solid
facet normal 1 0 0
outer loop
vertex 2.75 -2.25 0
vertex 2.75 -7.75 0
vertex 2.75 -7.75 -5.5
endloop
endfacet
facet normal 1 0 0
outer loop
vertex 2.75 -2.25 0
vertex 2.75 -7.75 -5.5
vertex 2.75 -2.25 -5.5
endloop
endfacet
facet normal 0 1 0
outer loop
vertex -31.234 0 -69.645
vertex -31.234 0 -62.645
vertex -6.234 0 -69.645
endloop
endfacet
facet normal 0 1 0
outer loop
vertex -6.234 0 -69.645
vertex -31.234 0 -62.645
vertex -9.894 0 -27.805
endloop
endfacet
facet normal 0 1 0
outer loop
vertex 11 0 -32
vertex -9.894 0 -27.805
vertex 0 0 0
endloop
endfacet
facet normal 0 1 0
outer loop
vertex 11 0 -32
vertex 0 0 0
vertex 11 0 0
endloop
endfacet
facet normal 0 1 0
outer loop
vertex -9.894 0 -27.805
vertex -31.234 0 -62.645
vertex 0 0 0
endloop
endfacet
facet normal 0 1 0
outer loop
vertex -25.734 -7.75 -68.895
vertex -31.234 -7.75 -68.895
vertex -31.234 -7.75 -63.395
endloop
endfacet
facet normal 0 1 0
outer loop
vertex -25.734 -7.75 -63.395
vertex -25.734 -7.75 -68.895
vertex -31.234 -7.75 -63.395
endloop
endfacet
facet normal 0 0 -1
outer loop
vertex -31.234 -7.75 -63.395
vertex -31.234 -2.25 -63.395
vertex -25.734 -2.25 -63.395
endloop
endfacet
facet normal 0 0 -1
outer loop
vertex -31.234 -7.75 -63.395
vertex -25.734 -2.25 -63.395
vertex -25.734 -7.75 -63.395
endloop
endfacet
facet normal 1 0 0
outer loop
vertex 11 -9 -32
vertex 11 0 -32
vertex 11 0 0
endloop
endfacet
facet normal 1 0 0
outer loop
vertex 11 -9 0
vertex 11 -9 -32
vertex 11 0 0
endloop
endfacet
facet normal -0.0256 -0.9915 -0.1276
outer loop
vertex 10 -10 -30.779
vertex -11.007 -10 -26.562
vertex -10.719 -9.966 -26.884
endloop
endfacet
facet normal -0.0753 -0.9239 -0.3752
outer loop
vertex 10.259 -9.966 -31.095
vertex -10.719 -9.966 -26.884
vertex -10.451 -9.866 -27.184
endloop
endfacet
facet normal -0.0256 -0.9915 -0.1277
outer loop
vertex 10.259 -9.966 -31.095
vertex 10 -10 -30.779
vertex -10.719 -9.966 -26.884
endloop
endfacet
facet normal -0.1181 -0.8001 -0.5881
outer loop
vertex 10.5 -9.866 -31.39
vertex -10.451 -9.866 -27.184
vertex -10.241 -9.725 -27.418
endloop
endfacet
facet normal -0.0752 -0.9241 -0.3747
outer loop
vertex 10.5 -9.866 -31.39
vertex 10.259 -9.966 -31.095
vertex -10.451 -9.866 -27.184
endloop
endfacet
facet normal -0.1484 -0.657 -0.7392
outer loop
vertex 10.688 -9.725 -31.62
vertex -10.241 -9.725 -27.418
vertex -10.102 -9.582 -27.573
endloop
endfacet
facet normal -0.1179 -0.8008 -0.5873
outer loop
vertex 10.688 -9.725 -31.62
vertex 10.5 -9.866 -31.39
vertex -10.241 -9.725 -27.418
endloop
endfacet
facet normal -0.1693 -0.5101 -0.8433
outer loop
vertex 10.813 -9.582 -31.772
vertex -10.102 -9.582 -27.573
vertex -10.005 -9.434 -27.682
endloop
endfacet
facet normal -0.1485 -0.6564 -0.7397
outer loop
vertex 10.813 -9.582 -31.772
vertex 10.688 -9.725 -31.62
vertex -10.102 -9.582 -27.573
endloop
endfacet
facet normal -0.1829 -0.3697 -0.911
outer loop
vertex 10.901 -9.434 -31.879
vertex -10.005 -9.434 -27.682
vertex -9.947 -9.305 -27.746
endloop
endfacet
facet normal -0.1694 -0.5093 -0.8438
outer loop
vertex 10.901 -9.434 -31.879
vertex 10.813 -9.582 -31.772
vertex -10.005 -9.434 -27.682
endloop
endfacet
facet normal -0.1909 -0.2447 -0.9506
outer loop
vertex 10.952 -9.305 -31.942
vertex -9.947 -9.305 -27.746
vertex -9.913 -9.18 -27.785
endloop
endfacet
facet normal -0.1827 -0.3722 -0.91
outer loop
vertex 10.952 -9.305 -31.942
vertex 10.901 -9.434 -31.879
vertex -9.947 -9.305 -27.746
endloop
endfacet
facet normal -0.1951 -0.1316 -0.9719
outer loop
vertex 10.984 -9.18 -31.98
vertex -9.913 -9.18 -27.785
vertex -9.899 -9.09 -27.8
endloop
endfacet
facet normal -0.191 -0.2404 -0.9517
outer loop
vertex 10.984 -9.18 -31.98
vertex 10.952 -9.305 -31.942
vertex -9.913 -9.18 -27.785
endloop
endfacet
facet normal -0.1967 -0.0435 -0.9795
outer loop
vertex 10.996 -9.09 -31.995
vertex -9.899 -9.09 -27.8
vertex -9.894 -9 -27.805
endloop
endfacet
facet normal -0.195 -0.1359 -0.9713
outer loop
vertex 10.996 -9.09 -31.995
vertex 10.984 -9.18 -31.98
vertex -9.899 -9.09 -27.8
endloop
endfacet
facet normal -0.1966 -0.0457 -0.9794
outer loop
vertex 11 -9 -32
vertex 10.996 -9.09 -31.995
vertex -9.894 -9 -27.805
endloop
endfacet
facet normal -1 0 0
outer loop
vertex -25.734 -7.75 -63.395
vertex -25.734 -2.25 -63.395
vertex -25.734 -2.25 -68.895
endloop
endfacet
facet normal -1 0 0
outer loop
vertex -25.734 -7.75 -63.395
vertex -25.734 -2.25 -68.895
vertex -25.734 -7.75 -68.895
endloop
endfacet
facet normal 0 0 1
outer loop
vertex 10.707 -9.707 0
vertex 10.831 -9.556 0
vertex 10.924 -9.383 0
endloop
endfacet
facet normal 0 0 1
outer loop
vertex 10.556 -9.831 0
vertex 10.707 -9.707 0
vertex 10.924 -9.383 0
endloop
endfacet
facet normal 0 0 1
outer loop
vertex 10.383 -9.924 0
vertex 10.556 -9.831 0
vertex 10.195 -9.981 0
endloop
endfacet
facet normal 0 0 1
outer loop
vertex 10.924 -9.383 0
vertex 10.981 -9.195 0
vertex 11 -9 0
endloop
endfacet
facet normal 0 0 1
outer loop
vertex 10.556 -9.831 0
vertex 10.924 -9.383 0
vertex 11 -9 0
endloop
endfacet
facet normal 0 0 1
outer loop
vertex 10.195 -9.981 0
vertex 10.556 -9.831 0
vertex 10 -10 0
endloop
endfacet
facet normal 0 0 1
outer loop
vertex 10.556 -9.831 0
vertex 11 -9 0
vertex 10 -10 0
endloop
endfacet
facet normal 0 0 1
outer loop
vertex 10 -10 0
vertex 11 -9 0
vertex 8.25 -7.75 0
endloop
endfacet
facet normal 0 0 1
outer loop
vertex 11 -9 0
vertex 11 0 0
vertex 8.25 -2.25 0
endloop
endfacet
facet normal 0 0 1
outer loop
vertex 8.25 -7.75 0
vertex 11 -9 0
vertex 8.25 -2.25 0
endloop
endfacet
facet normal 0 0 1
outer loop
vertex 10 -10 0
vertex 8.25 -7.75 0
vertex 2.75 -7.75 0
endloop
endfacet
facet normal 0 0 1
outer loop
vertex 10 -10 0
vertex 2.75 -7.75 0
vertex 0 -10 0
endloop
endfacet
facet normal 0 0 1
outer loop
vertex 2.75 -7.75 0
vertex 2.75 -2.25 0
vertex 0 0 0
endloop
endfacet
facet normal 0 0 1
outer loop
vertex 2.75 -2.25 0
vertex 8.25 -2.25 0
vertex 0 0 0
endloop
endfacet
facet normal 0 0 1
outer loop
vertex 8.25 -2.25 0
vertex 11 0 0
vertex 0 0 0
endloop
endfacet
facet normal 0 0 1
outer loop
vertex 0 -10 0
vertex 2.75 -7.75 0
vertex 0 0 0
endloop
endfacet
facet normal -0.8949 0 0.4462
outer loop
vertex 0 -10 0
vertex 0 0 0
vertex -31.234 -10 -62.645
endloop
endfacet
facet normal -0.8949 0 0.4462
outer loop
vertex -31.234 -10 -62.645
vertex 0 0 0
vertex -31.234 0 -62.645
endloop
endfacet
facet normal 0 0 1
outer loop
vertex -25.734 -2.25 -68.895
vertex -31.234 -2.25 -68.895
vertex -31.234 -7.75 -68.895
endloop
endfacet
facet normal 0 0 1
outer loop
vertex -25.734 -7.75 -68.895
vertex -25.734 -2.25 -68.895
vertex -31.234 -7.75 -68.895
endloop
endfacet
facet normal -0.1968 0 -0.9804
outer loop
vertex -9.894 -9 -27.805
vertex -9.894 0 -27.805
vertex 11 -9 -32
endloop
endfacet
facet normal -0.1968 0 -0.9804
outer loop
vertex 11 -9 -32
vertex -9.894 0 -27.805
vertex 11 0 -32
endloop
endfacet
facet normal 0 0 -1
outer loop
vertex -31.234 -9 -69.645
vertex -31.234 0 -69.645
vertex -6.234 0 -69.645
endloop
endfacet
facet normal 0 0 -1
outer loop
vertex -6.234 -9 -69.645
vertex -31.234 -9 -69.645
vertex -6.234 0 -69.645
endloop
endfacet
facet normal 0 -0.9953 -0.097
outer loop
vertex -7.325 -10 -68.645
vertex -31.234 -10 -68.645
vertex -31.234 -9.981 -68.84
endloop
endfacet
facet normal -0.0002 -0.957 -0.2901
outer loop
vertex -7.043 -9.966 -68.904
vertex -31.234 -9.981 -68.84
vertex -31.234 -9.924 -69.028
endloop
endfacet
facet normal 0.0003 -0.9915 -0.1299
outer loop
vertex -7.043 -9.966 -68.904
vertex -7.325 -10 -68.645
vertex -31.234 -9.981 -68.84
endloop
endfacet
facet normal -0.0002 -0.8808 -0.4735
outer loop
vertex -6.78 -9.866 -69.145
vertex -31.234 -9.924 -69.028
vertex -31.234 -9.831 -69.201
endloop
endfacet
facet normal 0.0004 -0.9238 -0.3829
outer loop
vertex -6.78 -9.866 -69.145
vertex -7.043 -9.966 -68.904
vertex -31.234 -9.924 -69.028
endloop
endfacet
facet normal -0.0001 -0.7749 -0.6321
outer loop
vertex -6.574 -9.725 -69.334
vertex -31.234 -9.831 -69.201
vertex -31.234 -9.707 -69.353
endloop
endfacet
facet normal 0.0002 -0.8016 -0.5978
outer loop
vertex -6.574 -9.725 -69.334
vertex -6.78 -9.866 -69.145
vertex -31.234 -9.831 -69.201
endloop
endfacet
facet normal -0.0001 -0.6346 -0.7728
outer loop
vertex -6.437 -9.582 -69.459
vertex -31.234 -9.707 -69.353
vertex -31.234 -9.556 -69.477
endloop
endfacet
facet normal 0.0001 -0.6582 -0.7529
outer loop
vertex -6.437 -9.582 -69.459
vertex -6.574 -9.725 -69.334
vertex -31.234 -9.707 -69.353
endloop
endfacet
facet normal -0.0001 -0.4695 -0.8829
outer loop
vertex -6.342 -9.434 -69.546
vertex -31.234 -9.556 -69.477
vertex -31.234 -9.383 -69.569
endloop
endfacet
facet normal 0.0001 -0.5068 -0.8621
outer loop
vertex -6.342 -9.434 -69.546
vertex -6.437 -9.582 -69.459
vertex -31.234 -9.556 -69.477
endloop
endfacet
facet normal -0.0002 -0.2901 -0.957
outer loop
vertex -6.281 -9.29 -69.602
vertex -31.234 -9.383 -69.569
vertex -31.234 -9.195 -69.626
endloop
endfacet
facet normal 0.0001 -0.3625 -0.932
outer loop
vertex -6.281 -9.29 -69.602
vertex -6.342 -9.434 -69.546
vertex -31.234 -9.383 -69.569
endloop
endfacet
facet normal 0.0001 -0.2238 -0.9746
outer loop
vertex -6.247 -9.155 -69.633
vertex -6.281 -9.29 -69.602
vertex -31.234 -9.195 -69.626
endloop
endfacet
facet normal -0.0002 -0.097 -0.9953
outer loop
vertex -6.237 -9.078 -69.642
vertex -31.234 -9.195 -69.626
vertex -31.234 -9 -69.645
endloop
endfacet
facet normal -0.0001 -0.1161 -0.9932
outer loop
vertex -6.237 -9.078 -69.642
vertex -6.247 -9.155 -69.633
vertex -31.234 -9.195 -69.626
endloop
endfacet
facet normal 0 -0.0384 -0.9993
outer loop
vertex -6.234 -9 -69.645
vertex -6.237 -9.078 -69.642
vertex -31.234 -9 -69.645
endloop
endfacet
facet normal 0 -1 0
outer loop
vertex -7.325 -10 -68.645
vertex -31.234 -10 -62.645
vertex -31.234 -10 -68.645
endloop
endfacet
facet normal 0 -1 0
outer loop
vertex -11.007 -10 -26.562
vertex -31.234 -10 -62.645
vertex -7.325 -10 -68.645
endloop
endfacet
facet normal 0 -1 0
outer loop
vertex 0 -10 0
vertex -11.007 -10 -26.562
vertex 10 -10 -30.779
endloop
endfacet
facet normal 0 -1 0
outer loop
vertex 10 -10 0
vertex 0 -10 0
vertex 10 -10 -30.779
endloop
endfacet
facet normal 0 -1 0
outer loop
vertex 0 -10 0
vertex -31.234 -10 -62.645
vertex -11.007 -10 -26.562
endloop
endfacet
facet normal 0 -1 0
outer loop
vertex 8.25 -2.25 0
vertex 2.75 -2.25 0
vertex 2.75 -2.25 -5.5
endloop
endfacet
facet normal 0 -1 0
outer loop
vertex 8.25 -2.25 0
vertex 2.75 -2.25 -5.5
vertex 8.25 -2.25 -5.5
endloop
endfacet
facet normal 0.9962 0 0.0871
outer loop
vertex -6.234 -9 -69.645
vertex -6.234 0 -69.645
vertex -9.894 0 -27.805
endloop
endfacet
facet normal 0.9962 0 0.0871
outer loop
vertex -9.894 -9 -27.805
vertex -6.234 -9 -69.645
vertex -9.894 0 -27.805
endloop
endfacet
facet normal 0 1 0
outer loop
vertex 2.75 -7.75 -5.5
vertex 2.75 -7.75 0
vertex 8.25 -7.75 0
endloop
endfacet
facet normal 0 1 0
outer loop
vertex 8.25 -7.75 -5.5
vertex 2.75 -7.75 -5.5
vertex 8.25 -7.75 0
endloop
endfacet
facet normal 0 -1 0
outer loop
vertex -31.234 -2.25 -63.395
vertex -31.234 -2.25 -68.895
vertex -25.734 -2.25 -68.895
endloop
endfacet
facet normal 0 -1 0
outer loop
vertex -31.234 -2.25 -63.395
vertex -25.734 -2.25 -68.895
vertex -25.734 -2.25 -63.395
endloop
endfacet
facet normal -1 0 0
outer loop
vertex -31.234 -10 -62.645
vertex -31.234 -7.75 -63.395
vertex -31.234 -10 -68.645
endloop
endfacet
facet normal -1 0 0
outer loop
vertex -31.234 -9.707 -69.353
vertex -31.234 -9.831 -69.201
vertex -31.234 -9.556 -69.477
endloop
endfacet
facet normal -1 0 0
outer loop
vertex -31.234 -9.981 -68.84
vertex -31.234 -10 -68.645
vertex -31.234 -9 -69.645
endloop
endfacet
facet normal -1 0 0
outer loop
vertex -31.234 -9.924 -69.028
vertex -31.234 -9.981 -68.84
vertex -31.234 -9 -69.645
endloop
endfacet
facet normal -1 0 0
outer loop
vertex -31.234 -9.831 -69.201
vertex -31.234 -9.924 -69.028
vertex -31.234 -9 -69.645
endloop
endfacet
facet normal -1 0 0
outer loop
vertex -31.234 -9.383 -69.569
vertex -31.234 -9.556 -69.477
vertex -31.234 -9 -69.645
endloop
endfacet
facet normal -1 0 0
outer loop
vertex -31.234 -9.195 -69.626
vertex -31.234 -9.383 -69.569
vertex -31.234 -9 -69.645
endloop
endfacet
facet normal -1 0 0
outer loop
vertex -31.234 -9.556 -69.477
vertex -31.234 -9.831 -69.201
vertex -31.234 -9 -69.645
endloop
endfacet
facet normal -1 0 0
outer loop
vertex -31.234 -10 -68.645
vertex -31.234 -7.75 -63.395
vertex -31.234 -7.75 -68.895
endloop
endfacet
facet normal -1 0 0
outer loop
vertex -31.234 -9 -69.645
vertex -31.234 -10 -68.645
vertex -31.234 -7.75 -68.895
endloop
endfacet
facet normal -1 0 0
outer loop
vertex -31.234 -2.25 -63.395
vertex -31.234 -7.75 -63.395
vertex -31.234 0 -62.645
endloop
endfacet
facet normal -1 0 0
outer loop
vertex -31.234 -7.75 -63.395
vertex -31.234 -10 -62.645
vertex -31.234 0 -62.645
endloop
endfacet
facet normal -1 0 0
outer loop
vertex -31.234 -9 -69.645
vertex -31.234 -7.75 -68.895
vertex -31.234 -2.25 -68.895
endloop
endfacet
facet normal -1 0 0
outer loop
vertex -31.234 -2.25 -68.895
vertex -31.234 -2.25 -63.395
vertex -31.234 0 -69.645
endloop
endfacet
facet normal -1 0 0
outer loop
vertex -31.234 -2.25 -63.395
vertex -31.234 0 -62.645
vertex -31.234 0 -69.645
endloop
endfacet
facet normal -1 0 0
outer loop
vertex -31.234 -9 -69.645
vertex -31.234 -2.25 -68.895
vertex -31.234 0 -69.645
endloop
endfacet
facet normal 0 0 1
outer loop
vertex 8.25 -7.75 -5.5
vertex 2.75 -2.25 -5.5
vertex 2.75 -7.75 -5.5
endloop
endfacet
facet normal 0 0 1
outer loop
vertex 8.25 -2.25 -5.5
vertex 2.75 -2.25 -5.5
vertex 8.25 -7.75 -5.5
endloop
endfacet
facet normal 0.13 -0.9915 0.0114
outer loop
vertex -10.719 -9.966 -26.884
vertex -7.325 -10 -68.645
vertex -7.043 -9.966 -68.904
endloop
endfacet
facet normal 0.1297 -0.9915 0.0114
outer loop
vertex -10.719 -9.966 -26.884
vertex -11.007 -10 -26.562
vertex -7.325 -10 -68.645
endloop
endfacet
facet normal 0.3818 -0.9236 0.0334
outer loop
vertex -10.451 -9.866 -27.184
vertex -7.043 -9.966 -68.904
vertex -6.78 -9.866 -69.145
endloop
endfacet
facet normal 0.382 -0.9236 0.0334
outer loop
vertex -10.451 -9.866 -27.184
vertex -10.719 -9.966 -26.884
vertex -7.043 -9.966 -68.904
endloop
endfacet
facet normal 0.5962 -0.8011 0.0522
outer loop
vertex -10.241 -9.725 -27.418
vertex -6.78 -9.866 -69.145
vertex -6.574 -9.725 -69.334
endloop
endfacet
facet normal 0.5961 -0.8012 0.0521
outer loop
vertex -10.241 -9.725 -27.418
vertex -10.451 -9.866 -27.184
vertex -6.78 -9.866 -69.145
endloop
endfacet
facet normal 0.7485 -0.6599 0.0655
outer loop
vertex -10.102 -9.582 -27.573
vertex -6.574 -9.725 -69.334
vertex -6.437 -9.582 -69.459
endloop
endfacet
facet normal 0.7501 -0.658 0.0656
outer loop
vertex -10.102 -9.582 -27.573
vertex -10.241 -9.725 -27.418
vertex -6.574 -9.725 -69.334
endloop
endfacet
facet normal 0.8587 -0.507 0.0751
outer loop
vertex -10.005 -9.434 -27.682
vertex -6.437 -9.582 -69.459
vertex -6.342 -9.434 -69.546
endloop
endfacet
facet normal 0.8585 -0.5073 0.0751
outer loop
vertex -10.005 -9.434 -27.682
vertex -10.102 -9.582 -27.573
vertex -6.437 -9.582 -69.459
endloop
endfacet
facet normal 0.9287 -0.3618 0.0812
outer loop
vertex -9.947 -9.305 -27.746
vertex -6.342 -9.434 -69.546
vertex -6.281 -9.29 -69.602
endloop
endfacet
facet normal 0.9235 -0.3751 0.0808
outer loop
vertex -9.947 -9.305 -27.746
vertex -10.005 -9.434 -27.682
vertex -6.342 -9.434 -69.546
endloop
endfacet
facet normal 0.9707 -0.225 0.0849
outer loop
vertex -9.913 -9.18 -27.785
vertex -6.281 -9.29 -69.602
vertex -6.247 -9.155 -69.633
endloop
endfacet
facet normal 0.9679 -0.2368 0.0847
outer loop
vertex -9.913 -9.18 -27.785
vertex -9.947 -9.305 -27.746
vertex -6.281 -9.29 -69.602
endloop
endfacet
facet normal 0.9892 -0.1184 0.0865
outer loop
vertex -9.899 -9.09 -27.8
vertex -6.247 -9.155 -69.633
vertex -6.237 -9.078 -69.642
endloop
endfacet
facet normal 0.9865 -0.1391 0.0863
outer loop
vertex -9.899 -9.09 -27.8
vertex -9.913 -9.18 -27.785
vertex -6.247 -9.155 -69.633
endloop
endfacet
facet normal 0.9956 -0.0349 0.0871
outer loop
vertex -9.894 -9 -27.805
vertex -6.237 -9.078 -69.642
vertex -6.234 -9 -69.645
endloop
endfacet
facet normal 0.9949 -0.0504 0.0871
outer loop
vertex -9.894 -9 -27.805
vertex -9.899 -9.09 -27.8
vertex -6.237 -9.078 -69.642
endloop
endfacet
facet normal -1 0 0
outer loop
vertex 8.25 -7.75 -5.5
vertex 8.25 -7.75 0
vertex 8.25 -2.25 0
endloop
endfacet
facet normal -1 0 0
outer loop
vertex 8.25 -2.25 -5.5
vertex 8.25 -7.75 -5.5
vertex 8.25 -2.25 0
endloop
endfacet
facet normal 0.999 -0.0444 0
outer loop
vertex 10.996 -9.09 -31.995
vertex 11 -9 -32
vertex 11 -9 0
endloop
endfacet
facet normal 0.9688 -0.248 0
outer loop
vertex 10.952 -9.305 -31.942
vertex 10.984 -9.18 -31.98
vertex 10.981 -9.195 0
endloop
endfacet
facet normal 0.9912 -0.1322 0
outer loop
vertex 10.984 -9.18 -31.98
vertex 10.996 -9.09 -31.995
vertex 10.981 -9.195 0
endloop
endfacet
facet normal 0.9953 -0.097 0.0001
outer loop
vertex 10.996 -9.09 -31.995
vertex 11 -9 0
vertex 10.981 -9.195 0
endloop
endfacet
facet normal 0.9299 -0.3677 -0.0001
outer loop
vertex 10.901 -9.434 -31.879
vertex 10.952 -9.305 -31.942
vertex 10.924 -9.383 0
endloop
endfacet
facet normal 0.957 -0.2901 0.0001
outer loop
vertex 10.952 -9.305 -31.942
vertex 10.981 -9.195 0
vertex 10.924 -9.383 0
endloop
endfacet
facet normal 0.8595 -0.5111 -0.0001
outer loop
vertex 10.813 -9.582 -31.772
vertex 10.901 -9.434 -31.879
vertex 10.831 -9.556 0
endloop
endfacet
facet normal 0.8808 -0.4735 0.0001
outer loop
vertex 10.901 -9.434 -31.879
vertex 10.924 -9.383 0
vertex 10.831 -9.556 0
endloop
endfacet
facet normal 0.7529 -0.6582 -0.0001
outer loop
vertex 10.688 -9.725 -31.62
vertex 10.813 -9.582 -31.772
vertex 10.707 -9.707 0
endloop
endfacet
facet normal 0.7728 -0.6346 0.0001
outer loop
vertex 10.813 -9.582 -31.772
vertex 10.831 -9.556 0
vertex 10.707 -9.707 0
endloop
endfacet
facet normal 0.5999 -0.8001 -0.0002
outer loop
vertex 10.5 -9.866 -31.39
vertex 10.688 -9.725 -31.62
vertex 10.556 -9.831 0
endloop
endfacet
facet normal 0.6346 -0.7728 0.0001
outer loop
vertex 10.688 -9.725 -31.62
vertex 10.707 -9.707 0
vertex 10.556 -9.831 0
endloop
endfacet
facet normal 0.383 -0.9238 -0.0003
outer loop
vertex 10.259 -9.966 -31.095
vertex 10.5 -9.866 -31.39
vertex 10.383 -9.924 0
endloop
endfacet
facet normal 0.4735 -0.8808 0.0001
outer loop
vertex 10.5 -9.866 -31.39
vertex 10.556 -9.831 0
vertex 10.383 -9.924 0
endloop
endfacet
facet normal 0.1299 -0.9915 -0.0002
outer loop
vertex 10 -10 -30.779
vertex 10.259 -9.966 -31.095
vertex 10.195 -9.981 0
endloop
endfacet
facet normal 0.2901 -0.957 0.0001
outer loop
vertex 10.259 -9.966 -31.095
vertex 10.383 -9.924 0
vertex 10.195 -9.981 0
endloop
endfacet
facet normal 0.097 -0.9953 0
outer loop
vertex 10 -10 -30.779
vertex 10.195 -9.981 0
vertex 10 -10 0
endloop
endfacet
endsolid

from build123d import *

# Parameters (mm, degrees)
F1_DEPTH = 10
F2_W     = 5.5
F2_H     = 5.5
F3_DEPTH = 5.5
F4_W     = 5.5
F4_H     = 5.5
F5_DEPTH = 5.5
F6_R     = 1


with BuildPart() as f1:
    # F0 (on Front) → F1 (new body)
    with BuildSketch(Plane.XZ):
        Polygon((11, 0), (0, 0), (-31.233847, -62.645405), (-31.233847, -69.645405), (-6.233847, -69.645405), (-9.894388, -27.805228), (11, -32), align=None)
    extrude(amount=F1_DEPTH)

    # F2 (on face) → F3 (cut)
    with BuildSketch(Plane(origin=(-31.233847, 0, 0), x_dir=(0, -1, 0), z_dir=(-1, 0, 0))):
        with Locations((5, -66.145405)):
            Rectangle(F2_W, F2_H)
    extrude(amount=-F3_DEPTH, mode=Mode.SUBTRACT)

    # F4 (on face) → F5 (cut)
    with BuildSketch(Plane.XY):
        with Locations((5.5, -5)):
            Rectangle(F4_W, F4_H)
    extrude(amount=-F5_DEPTH, mode=Mode.SUBTRACT)

    # F6
    f6_edges = [f1.edges().sort_by_distance(p)[0] for p in [
        (0.552806, -10, -29.902614),
        (-18.733847, -10, -69.645405),
        (-8.064118, -10, -48.725317),
        (11, -10, -16),
    ]]
    fillet(f6_edges, radius=F6_R)


solid = f1.part
